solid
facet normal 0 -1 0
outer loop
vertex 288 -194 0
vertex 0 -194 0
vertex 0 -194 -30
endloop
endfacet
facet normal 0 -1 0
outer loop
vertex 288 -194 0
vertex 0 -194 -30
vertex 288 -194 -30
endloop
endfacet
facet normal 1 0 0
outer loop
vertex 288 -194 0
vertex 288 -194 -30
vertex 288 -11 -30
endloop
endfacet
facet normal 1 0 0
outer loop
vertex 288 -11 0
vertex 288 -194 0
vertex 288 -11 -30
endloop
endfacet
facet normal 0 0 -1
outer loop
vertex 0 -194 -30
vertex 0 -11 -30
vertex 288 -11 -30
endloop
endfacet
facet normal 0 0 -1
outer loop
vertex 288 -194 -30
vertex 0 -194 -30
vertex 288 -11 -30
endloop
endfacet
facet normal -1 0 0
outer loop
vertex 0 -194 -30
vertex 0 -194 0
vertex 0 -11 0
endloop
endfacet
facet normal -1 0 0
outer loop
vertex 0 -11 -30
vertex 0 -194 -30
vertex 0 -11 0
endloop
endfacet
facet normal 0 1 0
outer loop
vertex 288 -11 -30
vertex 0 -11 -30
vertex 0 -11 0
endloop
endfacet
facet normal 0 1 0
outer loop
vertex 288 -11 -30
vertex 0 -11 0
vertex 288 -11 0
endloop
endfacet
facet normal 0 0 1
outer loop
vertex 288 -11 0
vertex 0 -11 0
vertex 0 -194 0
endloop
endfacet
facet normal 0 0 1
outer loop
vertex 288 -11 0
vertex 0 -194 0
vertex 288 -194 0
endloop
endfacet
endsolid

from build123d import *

# Parameters (mm, degrees)
IZIM1_W                    = 595
IZIM1_H                    = 194
TABAN_FLAN_1_DEPTH         = 30
KES_EKSTR_ZYON1_DEPTH      = 627.546885716
KES_EKSTR_ZYON1_DEPTH_BACK = 627.546885716
IZIM2_W                    = 307
IZIM2_H                    = 194
KES_EKSTR_ZYON2_DEPTH      = 349.539811212
KES_EKSTR_ZYON2_DEPTH_BACK = 349.539811212
IZIM3_W                    = 288
IZIM3_H                    = 11


# Sheet-metal steps are written as plain solids
with BuildPart() as part:
    # Çizim1 → Taban-Flanş1 (new body)
    with BuildSketch(Plane.XY):
        with Locations((297.5, -97)):
            Rectangle(IZIM1_W, IZIM1_H)
    extrude(amount=-TABAN_FLAN_1_DEPTH)

    # Çizim2 → Kes-Ekstrüzyon1 (cut, two sides: drawn at the far end of the back side and taken through both)
    with BuildSketch(Plane.XY.offset(-KES_EKSTR_ZYON1_DEPTH_BACK)):
        with Locations((441.5, -97)):
            Rectangle(IZIM2_W, IZIM2_H)
    extrude(amount=KES_EKSTR_ZYON1_DEPTH + KES_EKSTR_ZYON1_DEPTH_BACK, mode=Mode.SUBTRACT)

    # Çizim3 → Kes-Ekstrüzyon2 (cut, two sides: drawn at the far end of the back side and taken through both)
    with BuildSketch(Plane.XY.offset(-KES_EKSTR_ZYON2_DEPTH_BACK)):
        with Locations((144, -5.5)):
            Rectangle(IZIM3_W, IZIM3_H)
    extrude(amount=KES_EKSTR_ZYON2_DEPTH + KES_EKSTR_ZYON2_DEPTH_BACK, mode=Mode.SUBTRACT)


solid = part.part
